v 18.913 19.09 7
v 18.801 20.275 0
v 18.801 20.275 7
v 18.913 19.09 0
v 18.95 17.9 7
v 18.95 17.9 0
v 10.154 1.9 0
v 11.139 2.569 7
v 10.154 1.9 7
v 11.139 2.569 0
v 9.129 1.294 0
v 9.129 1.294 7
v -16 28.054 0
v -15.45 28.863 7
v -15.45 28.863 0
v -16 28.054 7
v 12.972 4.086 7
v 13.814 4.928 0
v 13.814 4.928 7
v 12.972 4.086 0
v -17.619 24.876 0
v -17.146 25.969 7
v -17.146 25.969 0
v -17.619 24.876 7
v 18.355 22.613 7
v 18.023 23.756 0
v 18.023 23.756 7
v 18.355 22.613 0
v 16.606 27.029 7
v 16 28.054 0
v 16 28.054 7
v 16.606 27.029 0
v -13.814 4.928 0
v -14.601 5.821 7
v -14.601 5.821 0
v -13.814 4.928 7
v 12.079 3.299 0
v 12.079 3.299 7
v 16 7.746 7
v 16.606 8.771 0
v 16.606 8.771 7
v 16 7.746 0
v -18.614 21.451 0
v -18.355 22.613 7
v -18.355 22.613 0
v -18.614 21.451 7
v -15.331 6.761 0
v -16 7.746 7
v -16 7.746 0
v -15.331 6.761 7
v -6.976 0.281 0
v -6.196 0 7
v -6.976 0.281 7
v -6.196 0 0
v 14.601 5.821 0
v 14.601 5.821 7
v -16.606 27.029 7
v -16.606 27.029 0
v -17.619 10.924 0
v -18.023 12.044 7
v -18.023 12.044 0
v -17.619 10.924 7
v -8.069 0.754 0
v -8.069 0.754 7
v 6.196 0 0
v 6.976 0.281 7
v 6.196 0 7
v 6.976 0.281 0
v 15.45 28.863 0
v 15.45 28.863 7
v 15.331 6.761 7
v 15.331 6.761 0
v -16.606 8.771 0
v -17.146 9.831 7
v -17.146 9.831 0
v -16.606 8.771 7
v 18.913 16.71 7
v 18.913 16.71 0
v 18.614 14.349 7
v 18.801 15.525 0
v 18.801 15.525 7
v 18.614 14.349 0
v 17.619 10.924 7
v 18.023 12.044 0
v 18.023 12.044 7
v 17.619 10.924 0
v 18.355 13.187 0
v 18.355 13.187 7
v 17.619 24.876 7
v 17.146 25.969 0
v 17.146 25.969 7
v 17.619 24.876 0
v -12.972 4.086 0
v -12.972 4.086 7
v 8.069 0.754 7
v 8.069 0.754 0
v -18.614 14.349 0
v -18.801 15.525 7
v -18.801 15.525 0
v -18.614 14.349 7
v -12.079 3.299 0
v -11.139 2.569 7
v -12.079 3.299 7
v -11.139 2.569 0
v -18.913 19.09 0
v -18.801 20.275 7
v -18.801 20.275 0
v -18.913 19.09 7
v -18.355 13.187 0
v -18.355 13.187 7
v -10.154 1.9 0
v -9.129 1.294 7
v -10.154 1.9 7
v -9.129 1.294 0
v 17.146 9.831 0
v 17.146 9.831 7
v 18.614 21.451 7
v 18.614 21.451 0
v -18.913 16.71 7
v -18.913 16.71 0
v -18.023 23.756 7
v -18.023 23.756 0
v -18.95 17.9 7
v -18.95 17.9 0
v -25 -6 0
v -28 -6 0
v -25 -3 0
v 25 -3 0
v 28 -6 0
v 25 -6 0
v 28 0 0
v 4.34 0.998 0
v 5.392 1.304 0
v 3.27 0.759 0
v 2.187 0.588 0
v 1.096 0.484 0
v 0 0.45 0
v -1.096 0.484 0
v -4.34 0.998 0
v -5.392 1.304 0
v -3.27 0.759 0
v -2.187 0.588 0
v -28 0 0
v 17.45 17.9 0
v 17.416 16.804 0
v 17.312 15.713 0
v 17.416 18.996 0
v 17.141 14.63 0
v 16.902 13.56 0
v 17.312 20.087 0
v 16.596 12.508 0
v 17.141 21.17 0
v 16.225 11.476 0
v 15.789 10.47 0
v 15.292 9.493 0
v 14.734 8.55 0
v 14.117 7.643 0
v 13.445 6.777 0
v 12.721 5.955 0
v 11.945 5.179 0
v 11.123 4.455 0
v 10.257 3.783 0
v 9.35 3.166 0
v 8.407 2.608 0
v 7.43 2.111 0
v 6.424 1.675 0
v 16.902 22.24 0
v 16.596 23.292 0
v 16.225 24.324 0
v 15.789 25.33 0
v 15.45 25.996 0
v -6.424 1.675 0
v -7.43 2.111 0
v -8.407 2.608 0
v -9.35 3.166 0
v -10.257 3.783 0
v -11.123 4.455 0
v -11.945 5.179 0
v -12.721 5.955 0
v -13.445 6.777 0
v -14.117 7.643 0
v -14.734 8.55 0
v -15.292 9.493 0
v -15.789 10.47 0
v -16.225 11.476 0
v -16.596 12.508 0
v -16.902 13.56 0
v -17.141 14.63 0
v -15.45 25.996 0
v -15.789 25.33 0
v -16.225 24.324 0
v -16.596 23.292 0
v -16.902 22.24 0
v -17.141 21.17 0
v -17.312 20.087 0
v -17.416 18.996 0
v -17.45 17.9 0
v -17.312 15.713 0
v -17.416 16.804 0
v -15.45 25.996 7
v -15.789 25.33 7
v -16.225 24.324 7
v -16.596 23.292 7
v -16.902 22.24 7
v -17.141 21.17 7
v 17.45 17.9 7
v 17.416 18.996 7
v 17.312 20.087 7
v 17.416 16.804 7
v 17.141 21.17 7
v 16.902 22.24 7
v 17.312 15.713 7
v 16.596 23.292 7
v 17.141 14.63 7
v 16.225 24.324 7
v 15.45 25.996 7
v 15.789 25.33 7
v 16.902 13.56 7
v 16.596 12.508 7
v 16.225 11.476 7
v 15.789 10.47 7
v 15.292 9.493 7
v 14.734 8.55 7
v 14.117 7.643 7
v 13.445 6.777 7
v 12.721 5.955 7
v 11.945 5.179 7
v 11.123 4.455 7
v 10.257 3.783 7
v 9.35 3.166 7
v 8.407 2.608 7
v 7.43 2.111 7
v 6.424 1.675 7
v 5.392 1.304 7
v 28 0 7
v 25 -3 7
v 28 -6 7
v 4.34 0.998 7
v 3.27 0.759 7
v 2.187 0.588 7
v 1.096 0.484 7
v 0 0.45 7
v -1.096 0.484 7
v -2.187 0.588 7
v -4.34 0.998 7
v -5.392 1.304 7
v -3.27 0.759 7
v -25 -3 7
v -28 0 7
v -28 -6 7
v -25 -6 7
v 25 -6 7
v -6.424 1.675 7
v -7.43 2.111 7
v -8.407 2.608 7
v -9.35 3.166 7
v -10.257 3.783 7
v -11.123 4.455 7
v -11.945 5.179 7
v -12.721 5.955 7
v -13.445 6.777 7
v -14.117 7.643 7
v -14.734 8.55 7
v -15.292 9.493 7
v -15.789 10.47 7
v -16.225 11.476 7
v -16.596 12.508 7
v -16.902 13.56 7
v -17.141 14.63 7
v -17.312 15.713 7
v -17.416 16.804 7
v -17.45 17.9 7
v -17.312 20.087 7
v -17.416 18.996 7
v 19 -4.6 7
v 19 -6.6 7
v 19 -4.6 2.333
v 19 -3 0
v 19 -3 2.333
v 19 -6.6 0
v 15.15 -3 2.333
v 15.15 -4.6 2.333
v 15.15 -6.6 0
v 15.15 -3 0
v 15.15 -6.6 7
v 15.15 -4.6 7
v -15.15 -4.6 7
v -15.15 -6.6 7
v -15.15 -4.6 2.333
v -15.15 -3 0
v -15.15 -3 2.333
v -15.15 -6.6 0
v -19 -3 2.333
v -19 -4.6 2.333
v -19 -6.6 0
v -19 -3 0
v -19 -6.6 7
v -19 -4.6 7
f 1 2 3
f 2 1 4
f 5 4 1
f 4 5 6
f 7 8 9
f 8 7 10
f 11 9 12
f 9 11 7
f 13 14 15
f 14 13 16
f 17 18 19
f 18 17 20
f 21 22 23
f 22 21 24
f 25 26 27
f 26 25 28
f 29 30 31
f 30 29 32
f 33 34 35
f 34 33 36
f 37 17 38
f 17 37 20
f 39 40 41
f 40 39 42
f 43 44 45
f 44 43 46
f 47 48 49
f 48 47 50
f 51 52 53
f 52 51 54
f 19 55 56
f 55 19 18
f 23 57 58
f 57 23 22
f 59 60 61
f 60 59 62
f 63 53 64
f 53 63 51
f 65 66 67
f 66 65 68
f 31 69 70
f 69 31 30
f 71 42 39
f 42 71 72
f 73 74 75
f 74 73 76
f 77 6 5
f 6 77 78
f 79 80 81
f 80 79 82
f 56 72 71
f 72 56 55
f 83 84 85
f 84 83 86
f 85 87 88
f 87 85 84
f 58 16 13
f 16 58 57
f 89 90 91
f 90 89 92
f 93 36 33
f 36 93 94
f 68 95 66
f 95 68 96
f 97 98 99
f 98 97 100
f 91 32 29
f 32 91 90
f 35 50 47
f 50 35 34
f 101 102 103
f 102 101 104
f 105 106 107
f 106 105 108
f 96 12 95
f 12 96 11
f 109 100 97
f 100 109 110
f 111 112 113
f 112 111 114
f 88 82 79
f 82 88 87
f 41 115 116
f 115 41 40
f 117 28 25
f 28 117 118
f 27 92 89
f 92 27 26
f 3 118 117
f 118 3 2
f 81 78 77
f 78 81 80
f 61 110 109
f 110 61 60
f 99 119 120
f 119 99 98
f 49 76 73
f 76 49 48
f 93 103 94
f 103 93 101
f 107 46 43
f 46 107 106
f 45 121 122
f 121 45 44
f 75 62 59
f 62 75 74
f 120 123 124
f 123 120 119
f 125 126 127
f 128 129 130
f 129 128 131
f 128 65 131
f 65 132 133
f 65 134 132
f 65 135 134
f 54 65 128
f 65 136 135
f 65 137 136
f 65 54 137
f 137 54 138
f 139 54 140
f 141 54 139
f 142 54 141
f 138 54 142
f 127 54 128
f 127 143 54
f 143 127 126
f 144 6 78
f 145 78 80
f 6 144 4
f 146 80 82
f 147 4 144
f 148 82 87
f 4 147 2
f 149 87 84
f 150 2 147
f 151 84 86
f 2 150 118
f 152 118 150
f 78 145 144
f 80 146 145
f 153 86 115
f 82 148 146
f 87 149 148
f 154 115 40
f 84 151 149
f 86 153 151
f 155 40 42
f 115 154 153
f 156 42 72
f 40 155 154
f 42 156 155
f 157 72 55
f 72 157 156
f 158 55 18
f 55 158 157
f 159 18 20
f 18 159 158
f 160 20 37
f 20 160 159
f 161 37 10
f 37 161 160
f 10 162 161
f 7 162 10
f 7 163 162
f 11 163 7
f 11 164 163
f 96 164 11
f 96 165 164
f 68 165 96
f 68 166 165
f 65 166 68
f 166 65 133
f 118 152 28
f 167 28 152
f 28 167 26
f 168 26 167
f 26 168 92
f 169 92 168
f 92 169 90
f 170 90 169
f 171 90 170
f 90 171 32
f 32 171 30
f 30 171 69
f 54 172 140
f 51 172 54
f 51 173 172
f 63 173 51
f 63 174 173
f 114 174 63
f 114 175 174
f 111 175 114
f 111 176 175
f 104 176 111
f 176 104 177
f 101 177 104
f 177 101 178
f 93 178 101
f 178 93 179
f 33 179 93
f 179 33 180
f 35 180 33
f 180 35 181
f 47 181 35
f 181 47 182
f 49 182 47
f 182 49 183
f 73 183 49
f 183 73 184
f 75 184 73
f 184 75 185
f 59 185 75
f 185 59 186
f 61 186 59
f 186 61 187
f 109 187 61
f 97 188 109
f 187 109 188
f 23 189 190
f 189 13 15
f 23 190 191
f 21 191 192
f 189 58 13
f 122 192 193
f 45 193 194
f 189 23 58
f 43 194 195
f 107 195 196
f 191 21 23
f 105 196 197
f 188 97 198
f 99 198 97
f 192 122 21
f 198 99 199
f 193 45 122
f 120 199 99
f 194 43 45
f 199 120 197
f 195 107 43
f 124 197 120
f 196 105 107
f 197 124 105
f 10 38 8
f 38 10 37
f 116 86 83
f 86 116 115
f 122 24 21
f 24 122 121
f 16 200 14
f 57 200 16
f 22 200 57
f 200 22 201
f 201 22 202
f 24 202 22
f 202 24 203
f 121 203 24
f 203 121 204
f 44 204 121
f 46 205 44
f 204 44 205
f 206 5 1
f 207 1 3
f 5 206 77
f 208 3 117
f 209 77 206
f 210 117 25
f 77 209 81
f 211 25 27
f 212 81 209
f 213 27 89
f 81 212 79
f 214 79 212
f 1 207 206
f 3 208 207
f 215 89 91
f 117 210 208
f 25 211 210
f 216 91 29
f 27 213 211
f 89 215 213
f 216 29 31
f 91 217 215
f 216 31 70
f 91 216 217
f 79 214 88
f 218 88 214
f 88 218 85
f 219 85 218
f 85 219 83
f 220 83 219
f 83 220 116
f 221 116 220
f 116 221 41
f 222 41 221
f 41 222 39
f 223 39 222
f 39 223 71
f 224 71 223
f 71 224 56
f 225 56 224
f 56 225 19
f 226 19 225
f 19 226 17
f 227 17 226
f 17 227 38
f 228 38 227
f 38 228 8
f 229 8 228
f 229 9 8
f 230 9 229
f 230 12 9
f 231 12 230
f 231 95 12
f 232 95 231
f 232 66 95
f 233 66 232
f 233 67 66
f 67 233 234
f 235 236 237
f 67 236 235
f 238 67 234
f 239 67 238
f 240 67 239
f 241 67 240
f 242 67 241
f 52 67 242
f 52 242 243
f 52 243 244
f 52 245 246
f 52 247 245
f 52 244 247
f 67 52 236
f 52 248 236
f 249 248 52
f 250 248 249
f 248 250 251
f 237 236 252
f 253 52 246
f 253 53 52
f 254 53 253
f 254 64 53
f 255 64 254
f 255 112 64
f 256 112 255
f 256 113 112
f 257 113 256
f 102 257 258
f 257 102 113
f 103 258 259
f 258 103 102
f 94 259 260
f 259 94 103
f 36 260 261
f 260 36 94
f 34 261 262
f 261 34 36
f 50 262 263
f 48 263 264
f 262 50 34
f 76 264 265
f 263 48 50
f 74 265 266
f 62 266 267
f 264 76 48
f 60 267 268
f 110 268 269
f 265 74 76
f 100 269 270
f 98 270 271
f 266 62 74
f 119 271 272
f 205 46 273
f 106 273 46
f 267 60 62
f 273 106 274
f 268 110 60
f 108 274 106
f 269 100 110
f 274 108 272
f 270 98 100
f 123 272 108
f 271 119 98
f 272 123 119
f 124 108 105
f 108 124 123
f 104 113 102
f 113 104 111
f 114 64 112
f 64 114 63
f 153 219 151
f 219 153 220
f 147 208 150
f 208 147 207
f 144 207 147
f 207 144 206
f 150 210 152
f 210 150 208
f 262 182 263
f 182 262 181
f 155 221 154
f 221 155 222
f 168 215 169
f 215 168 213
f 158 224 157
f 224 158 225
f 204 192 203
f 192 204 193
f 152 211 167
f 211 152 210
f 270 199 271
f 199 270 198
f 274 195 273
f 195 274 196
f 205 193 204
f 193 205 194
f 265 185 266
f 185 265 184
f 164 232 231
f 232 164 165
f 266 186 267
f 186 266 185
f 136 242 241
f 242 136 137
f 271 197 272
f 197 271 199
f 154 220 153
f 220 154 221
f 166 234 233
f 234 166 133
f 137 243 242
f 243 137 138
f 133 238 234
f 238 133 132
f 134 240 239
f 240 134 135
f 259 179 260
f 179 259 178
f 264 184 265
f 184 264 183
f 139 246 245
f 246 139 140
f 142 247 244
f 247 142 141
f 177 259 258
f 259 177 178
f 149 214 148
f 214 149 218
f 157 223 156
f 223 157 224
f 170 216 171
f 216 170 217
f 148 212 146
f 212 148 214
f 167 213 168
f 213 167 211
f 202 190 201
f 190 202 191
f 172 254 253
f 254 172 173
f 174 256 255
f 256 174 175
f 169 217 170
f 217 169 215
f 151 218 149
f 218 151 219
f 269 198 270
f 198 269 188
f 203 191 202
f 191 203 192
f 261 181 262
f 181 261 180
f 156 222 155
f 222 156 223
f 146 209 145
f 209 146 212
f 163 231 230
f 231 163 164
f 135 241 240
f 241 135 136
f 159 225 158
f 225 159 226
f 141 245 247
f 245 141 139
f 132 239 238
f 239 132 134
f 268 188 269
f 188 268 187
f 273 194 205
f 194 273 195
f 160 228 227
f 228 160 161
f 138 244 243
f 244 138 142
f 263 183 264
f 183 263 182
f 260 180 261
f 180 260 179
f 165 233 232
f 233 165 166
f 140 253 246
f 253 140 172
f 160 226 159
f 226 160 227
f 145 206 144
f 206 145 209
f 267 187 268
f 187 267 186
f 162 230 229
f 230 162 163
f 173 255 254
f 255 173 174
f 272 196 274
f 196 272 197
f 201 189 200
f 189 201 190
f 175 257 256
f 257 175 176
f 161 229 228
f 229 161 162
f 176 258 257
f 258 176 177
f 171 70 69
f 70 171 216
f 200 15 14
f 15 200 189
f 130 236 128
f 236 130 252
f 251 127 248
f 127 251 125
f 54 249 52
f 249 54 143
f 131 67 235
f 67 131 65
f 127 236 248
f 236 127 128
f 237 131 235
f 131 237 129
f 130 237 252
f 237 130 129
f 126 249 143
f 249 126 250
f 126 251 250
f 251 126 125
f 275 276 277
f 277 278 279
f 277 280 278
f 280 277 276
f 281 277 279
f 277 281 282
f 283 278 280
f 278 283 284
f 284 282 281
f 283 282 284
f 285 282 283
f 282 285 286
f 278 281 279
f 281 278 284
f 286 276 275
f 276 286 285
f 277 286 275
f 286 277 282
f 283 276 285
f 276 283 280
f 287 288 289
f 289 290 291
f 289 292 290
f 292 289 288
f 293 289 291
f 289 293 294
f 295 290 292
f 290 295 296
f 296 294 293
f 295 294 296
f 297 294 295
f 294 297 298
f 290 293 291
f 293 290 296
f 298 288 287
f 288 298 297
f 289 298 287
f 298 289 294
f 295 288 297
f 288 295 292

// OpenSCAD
cylinder_inner=34.9;
height=7;
claw_inner=50;
thickness=3;

knob_width=3.85;
knob_protusion=1.8;

module ring() {
    difference() {
        // ring
        difference() {
            cylinder(h=height, d=cylinder_inner+thickness, $fn=100);
            translate([0,0,-1]) cylinder(h=height+2, d=cylinder_inner,$fn=100);
        }
        translate([(-cylinder_inner+4)/2, 0, -1]) cube([cylinder_inner-4,cylinder_inner-4,height+2]);
    }
}

module claw() {
    cube([claw_inner,thickness,height]);
    translate([claw_inner,-thickness,0]) cube([thickness,thickness+thickness, height]);
    translate([-thickness,-thickness,0]) cube([thickness,thickness+thickness, height]);
}

module knob() {
    cube([knob_width, knob_protusion, (height/3)]);
    translate([0,-knob_protusion,0]) cube([knob_width, 2, height]);
}

translate([0,17.9,0]) ring();
//translate([-5,0,0]) #cube([10,2,height]);

translate([-claw_inner/2,-thickness,0]) claw();

translate([(claw_inner/2) - 6 - (knob_width), -thickness-knob_protusion, 0]) knob();

translate([-((claw_inner/2) - 6 ), -thickness-knob_protusion, 0]) knob();

//translate([-25, -thickness-knob_protusion, 0]) cube([6,6,6]);
